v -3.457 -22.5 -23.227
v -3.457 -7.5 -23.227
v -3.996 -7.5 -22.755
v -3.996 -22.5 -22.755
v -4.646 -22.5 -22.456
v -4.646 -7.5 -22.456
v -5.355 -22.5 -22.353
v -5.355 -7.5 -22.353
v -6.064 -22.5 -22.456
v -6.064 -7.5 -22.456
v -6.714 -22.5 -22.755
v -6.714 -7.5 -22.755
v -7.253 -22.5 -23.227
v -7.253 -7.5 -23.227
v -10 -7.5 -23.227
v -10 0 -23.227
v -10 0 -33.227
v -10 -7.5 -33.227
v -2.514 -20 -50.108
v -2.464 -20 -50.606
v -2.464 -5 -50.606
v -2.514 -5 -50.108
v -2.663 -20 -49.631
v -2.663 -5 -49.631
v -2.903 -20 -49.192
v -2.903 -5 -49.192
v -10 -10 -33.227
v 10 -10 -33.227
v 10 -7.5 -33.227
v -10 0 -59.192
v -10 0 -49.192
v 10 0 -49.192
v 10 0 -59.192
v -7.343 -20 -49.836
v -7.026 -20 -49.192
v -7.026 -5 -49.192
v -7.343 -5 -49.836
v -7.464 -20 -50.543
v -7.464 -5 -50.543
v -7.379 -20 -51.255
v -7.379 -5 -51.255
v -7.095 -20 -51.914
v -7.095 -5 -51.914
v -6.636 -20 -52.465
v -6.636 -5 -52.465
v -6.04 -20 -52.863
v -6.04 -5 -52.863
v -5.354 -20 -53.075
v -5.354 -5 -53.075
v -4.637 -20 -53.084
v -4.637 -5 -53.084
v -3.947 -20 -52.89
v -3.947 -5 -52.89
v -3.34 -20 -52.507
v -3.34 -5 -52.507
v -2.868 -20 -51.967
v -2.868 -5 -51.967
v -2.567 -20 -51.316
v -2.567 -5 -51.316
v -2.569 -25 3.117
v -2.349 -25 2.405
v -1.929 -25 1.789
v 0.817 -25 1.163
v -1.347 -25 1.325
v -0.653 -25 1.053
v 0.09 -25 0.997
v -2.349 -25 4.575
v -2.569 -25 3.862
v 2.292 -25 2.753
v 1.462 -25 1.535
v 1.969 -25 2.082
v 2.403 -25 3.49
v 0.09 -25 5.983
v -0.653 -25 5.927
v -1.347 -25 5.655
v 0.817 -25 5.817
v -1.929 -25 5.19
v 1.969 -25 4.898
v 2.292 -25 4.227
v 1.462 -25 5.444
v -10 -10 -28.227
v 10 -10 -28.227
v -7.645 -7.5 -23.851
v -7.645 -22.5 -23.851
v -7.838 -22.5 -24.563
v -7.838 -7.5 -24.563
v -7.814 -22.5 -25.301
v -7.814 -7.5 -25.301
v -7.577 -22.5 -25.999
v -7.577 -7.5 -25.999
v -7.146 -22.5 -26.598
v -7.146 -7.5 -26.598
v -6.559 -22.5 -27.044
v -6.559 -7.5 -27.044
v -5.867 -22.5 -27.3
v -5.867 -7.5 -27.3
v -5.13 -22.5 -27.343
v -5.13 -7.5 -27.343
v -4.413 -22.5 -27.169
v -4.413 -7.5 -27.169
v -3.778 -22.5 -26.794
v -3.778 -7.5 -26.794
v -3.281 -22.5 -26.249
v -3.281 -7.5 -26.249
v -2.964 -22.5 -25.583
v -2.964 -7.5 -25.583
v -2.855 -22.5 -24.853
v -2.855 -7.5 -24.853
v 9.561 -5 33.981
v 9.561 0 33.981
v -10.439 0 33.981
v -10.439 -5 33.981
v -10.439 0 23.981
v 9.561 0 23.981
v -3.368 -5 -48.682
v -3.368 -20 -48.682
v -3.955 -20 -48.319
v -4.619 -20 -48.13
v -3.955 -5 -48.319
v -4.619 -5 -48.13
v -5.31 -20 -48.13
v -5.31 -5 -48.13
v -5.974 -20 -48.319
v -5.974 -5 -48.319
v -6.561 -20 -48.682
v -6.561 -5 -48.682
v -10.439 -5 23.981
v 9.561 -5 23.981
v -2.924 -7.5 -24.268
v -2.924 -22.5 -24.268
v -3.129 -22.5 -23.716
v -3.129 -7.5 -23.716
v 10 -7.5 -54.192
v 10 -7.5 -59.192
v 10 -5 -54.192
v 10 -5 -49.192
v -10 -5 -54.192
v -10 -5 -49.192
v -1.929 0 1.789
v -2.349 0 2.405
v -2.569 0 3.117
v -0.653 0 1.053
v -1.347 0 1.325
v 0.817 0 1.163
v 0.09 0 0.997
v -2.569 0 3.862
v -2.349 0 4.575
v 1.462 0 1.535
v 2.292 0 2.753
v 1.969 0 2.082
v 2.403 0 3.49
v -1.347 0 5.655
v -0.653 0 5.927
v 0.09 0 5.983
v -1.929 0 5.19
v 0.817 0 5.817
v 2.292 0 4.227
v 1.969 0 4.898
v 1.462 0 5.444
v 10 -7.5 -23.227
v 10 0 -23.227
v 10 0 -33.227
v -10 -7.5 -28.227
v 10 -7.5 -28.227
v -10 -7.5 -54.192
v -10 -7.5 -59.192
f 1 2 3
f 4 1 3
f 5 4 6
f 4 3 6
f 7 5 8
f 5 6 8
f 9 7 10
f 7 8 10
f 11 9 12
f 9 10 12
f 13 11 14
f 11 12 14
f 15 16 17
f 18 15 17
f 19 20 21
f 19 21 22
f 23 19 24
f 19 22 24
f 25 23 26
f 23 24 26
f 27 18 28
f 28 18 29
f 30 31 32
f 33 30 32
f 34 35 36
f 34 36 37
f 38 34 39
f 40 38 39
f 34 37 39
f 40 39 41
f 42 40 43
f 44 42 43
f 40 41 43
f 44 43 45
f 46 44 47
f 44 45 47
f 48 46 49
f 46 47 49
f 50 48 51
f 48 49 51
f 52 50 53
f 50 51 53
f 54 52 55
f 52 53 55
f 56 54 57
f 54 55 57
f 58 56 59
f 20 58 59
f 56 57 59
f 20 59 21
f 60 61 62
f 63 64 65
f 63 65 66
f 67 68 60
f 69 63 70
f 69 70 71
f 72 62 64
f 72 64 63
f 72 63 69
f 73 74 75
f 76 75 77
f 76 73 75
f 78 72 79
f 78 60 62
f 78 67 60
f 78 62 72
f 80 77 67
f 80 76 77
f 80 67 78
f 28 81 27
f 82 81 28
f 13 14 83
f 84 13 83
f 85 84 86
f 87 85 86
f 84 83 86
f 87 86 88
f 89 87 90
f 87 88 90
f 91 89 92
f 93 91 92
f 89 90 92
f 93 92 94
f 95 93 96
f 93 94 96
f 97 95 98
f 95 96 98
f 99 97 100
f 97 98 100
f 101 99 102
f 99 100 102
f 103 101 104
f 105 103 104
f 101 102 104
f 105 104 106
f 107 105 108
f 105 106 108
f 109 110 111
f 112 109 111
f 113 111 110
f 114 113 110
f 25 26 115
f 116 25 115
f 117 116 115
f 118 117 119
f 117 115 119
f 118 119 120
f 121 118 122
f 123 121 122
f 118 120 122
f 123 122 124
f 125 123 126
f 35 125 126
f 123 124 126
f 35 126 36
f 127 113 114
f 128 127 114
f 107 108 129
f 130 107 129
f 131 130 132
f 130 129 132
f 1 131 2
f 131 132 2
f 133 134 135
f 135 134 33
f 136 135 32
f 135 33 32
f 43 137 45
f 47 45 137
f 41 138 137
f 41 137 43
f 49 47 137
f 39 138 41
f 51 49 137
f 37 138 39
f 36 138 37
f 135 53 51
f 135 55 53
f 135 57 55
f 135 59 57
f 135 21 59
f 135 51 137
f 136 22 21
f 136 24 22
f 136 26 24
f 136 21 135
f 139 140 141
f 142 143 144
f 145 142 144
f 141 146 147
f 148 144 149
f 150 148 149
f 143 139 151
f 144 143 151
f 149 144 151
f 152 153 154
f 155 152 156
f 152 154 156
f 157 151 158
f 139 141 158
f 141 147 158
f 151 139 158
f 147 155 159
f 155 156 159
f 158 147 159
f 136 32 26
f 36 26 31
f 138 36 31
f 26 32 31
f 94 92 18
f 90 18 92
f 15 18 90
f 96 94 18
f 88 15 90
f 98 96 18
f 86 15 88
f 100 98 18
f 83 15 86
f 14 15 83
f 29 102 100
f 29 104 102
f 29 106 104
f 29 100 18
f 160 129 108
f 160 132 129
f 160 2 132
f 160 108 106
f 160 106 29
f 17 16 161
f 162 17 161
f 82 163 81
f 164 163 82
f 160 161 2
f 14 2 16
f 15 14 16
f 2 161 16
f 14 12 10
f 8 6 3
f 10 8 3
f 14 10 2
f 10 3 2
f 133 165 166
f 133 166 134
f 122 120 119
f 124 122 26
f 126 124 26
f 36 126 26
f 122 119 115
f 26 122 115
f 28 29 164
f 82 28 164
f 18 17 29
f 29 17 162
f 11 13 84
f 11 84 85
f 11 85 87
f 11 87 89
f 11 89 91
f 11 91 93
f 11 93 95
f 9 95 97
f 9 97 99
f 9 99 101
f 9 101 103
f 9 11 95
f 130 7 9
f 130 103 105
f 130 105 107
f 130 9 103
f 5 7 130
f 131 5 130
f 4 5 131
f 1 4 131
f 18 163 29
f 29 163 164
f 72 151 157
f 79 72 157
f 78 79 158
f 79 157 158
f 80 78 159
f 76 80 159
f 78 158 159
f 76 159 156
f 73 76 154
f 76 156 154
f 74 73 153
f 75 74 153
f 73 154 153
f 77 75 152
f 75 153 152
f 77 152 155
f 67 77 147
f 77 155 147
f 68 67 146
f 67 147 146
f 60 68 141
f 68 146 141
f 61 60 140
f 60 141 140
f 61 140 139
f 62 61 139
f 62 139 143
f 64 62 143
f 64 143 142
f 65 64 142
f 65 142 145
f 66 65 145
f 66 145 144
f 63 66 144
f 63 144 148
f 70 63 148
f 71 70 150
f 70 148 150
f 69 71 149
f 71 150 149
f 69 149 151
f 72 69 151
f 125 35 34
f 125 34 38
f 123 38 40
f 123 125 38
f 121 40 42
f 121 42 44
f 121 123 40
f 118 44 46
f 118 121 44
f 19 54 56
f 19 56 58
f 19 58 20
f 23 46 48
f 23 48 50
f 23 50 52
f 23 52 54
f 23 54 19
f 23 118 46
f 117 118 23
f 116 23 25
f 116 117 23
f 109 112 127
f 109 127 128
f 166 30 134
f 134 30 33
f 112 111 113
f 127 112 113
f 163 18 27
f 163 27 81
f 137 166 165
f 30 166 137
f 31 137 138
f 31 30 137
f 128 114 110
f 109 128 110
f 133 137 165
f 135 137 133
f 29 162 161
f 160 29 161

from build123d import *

# Parameters (mm, degrees)
F1_DEPTH  = 5
F2_R      = 2.5
F3_DEPTH  = 25
F5_DEPTH  = 7.5
F7_DEPTH  = 5
F8_W      = 20
F8_H      = 5
F9_DEPTH  = 2.5
F10_W     = 20
F10_H     = 5
F11_DEPTH = 2.5
F13_DEPTH = 15
F15_DEPTH = 15


with BuildPart() as f1:
    # F0 (on Front) → F1 (new body)
    with BuildSketch(Plane.XZ):
        Polygon((-9.5611989871, 33.9807206666), (-10.4388010129, 33.9807206666), (-10.4388010129, 23.9807206666), (-9.5611989871, 23.9807206666), (9.5611989871, 23.9807206666), (9.5611989871, 33.9807206666), align=None)
    extrude(amount=F1_DEPTH)


with BuildPart() as f3:
    # F2 (on Front) → F3 (new body)
    with BuildSketch(Plane.XZ):
        with Locations((-0.0967326268, 3.4898421727)):
            Circle(F2_R)
    extrude(amount=F3_DEPTH)


with BuildPart() as f5:
    # F4 (on Front) → F5 (new body)
    with BuildSketch(Plane.XZ):
        Polygon((-7.0380929299, -23.2265152782), (-10, -23.2265152782), (-10, -33.2265152782), (-7.0380929299, -33.2265152782), (10, -33.2265152782), (10, -23.2265152782), align=None)
    extrude(amount=F5_DEPTH)

    # F12 (on face) → F13 (join)
    with BuildSketch(Plane.XZ.offset(7.5)):
        with BuildLine():
            Line((-7.2531588168, -23.2265152782), (-3.4565283193, -23.2265152782))
            ThreePointArc((-3.4565283193, -23.2265152782), (-5.3548435681, -22.35329099), (-7.2531588168, -23.2265152782))
        make_face()
        with BuildLine():
            ThreePointArc((-7.2531588168, -23.2265152782), (-6.222083984, -27.1980498392), (-2.8548435681, -24.85329099))
            ThreePointArc((-2.8548435681, -24.85329099), (-3.0100847189, -23.986050574), (-3.4565283193, -23.2265152782))
            Line((-3.4565283193, -23.2265152782), (-7.2531588168, -23.2265152782))
        make_face()
    extrude(amount=F13_DEPTH)


with BuildPart() as f7:
    # F6 (on Front) → F7 (new body)
    with BuildSketch(Plane.XZ):
        Polygon((7.257495299, -49.1919507086), (-10, -49.1919507086), (-10, -59.1919507086), (7.257495299, -59.1919507086), (10, -59.1919507086), (10, -49.1919507086), align=None)
    extrude(amount=F7_DEPTH)

    # F10 (on face) → F11 (join)
    with BuildSketch(Plane.XZ.offset(5)):
        with Locations((0, -56.6919507086)):
            Rectangle(F10_W, F10_H)
    extrude(amount=F11_DEPTH)

    # F14 (on face) → F15 (join)
    with BuildSketch(Plane.XZ.offset(5)):
        with BuildLine():
            ThreePointArc((-7.0261559945, -49.1919507086), (-5.7046692057, -52.9938797425), (-2.4644708633, -50.6059713662))
            ThreePointArc((-2.4644708633, -50.6059713662), (-2.576562487, -49.8657730238), (-2.9027857322, -49.1919507086))
            Line((-2.9027857322, -49.1919507086), (-7.0261559945, -49.1919507086))
        make_face()
        with BuildLine():
            Line((-7.0261559945, -49.1919507086), (-2.9027857322, -49.1919507086))
            ThreePointArc((-2.9027857322, -49.1919507086), (-4.9644708633, -48.1059713662), (-7.0261559945, -49.1919507086))
        make_face()
    extrude(amount=F15_DEPTH)


with BuildPart() as f9:
    # F8 (on face) → F9 (new body)
    with BuildSketch(Plane.XZ.offset(7.5)):
        with Locations((0, -30.7265152782)):
            Rectangle(F8_W, F8_H)
    extrude(amount=F9_DEPTH)


solid = Compound([f1.part, f3.part, f5.part, f7.part, f9.part])
